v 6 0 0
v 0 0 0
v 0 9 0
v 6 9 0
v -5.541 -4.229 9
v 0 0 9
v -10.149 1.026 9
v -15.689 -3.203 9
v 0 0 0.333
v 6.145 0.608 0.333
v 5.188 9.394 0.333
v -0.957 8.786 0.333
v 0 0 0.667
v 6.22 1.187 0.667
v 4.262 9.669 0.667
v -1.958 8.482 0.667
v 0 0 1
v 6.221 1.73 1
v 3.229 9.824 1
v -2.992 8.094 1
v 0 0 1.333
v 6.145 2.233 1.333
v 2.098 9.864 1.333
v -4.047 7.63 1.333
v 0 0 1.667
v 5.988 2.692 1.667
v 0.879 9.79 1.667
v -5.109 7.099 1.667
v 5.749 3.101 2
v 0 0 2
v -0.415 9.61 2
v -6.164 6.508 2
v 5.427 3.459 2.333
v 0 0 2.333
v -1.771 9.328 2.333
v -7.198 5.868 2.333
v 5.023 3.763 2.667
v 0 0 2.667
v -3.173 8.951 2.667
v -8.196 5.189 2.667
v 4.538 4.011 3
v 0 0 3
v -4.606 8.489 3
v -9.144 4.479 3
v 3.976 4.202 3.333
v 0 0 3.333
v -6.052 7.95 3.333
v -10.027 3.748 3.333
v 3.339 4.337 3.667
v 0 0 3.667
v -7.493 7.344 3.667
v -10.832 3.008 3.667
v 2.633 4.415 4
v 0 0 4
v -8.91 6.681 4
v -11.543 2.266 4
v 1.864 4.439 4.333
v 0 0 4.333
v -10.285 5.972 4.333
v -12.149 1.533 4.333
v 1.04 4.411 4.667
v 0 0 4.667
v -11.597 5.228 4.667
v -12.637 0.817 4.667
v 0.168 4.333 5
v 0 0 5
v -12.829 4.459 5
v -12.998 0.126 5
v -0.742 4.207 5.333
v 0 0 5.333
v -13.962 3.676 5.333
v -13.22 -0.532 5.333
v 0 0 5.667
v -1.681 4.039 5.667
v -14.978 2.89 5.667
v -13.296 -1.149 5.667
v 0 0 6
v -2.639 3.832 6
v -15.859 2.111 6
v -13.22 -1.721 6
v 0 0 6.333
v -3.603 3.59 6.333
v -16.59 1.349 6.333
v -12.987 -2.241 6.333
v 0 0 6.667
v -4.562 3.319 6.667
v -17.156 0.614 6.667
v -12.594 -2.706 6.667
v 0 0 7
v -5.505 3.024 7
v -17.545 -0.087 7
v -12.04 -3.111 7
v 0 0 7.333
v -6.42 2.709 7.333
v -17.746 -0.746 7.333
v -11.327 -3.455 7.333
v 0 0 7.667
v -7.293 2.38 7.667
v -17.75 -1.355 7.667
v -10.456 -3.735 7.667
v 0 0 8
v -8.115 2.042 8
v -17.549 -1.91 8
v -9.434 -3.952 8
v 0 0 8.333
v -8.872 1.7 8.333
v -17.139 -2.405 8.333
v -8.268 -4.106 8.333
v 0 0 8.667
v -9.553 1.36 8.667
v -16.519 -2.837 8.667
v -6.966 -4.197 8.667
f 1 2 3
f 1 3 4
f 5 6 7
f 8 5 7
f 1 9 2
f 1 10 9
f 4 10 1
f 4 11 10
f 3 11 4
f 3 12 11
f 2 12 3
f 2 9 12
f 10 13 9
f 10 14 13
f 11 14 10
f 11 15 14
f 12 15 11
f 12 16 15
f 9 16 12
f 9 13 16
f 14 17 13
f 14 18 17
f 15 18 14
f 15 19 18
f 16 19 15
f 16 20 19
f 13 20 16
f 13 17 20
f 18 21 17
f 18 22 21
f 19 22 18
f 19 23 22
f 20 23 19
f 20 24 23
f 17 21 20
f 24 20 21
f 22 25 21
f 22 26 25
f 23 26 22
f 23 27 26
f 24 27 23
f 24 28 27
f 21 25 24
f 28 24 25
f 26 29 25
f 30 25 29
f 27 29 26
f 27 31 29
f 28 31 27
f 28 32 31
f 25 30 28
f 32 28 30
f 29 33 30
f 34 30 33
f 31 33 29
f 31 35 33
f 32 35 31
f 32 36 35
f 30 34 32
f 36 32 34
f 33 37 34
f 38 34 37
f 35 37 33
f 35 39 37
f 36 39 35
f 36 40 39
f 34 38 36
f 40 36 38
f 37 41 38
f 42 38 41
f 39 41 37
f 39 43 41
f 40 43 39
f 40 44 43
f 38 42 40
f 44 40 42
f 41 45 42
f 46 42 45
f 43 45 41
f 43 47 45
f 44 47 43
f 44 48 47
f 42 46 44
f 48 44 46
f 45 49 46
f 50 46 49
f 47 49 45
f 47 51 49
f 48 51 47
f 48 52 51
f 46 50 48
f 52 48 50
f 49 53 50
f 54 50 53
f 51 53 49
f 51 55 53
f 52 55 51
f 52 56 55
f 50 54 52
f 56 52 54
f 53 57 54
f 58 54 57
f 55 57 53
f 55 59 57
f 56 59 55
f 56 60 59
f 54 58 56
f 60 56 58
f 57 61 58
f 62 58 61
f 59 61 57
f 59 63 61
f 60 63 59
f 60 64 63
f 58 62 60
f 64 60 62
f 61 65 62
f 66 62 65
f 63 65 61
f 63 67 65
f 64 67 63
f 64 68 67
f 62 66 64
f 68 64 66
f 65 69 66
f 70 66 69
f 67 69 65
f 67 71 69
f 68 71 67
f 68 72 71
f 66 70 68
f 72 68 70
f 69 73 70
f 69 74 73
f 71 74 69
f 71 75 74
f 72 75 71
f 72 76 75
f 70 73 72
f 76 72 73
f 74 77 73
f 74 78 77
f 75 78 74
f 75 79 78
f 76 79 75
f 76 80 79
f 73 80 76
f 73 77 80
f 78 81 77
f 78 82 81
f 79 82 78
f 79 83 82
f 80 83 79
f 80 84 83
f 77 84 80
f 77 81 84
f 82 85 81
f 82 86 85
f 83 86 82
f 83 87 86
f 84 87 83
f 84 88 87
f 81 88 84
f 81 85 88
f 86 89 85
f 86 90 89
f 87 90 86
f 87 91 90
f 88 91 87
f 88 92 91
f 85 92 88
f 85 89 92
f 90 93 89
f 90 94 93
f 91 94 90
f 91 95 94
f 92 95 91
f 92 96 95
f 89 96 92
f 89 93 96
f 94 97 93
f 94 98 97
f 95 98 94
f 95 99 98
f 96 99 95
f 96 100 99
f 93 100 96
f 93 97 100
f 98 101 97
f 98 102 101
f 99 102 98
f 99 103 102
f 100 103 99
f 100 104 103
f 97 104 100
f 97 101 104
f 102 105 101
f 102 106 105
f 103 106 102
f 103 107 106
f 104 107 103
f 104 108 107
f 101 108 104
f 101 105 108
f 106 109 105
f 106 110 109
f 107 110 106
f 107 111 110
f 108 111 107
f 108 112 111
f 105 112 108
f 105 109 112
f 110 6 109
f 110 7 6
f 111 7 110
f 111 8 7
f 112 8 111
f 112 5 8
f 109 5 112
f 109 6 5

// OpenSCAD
// Combined negative twist with non-uniform scale: the sweep rotates the other
// way, and the scale still applies in the fixed frame after the rotation.
// oracle: tris
$fa=6;$fs=1.2;
linear_extrude(height=9,twist=-160,scale=[1.8,0.5]) square([6,9]);
